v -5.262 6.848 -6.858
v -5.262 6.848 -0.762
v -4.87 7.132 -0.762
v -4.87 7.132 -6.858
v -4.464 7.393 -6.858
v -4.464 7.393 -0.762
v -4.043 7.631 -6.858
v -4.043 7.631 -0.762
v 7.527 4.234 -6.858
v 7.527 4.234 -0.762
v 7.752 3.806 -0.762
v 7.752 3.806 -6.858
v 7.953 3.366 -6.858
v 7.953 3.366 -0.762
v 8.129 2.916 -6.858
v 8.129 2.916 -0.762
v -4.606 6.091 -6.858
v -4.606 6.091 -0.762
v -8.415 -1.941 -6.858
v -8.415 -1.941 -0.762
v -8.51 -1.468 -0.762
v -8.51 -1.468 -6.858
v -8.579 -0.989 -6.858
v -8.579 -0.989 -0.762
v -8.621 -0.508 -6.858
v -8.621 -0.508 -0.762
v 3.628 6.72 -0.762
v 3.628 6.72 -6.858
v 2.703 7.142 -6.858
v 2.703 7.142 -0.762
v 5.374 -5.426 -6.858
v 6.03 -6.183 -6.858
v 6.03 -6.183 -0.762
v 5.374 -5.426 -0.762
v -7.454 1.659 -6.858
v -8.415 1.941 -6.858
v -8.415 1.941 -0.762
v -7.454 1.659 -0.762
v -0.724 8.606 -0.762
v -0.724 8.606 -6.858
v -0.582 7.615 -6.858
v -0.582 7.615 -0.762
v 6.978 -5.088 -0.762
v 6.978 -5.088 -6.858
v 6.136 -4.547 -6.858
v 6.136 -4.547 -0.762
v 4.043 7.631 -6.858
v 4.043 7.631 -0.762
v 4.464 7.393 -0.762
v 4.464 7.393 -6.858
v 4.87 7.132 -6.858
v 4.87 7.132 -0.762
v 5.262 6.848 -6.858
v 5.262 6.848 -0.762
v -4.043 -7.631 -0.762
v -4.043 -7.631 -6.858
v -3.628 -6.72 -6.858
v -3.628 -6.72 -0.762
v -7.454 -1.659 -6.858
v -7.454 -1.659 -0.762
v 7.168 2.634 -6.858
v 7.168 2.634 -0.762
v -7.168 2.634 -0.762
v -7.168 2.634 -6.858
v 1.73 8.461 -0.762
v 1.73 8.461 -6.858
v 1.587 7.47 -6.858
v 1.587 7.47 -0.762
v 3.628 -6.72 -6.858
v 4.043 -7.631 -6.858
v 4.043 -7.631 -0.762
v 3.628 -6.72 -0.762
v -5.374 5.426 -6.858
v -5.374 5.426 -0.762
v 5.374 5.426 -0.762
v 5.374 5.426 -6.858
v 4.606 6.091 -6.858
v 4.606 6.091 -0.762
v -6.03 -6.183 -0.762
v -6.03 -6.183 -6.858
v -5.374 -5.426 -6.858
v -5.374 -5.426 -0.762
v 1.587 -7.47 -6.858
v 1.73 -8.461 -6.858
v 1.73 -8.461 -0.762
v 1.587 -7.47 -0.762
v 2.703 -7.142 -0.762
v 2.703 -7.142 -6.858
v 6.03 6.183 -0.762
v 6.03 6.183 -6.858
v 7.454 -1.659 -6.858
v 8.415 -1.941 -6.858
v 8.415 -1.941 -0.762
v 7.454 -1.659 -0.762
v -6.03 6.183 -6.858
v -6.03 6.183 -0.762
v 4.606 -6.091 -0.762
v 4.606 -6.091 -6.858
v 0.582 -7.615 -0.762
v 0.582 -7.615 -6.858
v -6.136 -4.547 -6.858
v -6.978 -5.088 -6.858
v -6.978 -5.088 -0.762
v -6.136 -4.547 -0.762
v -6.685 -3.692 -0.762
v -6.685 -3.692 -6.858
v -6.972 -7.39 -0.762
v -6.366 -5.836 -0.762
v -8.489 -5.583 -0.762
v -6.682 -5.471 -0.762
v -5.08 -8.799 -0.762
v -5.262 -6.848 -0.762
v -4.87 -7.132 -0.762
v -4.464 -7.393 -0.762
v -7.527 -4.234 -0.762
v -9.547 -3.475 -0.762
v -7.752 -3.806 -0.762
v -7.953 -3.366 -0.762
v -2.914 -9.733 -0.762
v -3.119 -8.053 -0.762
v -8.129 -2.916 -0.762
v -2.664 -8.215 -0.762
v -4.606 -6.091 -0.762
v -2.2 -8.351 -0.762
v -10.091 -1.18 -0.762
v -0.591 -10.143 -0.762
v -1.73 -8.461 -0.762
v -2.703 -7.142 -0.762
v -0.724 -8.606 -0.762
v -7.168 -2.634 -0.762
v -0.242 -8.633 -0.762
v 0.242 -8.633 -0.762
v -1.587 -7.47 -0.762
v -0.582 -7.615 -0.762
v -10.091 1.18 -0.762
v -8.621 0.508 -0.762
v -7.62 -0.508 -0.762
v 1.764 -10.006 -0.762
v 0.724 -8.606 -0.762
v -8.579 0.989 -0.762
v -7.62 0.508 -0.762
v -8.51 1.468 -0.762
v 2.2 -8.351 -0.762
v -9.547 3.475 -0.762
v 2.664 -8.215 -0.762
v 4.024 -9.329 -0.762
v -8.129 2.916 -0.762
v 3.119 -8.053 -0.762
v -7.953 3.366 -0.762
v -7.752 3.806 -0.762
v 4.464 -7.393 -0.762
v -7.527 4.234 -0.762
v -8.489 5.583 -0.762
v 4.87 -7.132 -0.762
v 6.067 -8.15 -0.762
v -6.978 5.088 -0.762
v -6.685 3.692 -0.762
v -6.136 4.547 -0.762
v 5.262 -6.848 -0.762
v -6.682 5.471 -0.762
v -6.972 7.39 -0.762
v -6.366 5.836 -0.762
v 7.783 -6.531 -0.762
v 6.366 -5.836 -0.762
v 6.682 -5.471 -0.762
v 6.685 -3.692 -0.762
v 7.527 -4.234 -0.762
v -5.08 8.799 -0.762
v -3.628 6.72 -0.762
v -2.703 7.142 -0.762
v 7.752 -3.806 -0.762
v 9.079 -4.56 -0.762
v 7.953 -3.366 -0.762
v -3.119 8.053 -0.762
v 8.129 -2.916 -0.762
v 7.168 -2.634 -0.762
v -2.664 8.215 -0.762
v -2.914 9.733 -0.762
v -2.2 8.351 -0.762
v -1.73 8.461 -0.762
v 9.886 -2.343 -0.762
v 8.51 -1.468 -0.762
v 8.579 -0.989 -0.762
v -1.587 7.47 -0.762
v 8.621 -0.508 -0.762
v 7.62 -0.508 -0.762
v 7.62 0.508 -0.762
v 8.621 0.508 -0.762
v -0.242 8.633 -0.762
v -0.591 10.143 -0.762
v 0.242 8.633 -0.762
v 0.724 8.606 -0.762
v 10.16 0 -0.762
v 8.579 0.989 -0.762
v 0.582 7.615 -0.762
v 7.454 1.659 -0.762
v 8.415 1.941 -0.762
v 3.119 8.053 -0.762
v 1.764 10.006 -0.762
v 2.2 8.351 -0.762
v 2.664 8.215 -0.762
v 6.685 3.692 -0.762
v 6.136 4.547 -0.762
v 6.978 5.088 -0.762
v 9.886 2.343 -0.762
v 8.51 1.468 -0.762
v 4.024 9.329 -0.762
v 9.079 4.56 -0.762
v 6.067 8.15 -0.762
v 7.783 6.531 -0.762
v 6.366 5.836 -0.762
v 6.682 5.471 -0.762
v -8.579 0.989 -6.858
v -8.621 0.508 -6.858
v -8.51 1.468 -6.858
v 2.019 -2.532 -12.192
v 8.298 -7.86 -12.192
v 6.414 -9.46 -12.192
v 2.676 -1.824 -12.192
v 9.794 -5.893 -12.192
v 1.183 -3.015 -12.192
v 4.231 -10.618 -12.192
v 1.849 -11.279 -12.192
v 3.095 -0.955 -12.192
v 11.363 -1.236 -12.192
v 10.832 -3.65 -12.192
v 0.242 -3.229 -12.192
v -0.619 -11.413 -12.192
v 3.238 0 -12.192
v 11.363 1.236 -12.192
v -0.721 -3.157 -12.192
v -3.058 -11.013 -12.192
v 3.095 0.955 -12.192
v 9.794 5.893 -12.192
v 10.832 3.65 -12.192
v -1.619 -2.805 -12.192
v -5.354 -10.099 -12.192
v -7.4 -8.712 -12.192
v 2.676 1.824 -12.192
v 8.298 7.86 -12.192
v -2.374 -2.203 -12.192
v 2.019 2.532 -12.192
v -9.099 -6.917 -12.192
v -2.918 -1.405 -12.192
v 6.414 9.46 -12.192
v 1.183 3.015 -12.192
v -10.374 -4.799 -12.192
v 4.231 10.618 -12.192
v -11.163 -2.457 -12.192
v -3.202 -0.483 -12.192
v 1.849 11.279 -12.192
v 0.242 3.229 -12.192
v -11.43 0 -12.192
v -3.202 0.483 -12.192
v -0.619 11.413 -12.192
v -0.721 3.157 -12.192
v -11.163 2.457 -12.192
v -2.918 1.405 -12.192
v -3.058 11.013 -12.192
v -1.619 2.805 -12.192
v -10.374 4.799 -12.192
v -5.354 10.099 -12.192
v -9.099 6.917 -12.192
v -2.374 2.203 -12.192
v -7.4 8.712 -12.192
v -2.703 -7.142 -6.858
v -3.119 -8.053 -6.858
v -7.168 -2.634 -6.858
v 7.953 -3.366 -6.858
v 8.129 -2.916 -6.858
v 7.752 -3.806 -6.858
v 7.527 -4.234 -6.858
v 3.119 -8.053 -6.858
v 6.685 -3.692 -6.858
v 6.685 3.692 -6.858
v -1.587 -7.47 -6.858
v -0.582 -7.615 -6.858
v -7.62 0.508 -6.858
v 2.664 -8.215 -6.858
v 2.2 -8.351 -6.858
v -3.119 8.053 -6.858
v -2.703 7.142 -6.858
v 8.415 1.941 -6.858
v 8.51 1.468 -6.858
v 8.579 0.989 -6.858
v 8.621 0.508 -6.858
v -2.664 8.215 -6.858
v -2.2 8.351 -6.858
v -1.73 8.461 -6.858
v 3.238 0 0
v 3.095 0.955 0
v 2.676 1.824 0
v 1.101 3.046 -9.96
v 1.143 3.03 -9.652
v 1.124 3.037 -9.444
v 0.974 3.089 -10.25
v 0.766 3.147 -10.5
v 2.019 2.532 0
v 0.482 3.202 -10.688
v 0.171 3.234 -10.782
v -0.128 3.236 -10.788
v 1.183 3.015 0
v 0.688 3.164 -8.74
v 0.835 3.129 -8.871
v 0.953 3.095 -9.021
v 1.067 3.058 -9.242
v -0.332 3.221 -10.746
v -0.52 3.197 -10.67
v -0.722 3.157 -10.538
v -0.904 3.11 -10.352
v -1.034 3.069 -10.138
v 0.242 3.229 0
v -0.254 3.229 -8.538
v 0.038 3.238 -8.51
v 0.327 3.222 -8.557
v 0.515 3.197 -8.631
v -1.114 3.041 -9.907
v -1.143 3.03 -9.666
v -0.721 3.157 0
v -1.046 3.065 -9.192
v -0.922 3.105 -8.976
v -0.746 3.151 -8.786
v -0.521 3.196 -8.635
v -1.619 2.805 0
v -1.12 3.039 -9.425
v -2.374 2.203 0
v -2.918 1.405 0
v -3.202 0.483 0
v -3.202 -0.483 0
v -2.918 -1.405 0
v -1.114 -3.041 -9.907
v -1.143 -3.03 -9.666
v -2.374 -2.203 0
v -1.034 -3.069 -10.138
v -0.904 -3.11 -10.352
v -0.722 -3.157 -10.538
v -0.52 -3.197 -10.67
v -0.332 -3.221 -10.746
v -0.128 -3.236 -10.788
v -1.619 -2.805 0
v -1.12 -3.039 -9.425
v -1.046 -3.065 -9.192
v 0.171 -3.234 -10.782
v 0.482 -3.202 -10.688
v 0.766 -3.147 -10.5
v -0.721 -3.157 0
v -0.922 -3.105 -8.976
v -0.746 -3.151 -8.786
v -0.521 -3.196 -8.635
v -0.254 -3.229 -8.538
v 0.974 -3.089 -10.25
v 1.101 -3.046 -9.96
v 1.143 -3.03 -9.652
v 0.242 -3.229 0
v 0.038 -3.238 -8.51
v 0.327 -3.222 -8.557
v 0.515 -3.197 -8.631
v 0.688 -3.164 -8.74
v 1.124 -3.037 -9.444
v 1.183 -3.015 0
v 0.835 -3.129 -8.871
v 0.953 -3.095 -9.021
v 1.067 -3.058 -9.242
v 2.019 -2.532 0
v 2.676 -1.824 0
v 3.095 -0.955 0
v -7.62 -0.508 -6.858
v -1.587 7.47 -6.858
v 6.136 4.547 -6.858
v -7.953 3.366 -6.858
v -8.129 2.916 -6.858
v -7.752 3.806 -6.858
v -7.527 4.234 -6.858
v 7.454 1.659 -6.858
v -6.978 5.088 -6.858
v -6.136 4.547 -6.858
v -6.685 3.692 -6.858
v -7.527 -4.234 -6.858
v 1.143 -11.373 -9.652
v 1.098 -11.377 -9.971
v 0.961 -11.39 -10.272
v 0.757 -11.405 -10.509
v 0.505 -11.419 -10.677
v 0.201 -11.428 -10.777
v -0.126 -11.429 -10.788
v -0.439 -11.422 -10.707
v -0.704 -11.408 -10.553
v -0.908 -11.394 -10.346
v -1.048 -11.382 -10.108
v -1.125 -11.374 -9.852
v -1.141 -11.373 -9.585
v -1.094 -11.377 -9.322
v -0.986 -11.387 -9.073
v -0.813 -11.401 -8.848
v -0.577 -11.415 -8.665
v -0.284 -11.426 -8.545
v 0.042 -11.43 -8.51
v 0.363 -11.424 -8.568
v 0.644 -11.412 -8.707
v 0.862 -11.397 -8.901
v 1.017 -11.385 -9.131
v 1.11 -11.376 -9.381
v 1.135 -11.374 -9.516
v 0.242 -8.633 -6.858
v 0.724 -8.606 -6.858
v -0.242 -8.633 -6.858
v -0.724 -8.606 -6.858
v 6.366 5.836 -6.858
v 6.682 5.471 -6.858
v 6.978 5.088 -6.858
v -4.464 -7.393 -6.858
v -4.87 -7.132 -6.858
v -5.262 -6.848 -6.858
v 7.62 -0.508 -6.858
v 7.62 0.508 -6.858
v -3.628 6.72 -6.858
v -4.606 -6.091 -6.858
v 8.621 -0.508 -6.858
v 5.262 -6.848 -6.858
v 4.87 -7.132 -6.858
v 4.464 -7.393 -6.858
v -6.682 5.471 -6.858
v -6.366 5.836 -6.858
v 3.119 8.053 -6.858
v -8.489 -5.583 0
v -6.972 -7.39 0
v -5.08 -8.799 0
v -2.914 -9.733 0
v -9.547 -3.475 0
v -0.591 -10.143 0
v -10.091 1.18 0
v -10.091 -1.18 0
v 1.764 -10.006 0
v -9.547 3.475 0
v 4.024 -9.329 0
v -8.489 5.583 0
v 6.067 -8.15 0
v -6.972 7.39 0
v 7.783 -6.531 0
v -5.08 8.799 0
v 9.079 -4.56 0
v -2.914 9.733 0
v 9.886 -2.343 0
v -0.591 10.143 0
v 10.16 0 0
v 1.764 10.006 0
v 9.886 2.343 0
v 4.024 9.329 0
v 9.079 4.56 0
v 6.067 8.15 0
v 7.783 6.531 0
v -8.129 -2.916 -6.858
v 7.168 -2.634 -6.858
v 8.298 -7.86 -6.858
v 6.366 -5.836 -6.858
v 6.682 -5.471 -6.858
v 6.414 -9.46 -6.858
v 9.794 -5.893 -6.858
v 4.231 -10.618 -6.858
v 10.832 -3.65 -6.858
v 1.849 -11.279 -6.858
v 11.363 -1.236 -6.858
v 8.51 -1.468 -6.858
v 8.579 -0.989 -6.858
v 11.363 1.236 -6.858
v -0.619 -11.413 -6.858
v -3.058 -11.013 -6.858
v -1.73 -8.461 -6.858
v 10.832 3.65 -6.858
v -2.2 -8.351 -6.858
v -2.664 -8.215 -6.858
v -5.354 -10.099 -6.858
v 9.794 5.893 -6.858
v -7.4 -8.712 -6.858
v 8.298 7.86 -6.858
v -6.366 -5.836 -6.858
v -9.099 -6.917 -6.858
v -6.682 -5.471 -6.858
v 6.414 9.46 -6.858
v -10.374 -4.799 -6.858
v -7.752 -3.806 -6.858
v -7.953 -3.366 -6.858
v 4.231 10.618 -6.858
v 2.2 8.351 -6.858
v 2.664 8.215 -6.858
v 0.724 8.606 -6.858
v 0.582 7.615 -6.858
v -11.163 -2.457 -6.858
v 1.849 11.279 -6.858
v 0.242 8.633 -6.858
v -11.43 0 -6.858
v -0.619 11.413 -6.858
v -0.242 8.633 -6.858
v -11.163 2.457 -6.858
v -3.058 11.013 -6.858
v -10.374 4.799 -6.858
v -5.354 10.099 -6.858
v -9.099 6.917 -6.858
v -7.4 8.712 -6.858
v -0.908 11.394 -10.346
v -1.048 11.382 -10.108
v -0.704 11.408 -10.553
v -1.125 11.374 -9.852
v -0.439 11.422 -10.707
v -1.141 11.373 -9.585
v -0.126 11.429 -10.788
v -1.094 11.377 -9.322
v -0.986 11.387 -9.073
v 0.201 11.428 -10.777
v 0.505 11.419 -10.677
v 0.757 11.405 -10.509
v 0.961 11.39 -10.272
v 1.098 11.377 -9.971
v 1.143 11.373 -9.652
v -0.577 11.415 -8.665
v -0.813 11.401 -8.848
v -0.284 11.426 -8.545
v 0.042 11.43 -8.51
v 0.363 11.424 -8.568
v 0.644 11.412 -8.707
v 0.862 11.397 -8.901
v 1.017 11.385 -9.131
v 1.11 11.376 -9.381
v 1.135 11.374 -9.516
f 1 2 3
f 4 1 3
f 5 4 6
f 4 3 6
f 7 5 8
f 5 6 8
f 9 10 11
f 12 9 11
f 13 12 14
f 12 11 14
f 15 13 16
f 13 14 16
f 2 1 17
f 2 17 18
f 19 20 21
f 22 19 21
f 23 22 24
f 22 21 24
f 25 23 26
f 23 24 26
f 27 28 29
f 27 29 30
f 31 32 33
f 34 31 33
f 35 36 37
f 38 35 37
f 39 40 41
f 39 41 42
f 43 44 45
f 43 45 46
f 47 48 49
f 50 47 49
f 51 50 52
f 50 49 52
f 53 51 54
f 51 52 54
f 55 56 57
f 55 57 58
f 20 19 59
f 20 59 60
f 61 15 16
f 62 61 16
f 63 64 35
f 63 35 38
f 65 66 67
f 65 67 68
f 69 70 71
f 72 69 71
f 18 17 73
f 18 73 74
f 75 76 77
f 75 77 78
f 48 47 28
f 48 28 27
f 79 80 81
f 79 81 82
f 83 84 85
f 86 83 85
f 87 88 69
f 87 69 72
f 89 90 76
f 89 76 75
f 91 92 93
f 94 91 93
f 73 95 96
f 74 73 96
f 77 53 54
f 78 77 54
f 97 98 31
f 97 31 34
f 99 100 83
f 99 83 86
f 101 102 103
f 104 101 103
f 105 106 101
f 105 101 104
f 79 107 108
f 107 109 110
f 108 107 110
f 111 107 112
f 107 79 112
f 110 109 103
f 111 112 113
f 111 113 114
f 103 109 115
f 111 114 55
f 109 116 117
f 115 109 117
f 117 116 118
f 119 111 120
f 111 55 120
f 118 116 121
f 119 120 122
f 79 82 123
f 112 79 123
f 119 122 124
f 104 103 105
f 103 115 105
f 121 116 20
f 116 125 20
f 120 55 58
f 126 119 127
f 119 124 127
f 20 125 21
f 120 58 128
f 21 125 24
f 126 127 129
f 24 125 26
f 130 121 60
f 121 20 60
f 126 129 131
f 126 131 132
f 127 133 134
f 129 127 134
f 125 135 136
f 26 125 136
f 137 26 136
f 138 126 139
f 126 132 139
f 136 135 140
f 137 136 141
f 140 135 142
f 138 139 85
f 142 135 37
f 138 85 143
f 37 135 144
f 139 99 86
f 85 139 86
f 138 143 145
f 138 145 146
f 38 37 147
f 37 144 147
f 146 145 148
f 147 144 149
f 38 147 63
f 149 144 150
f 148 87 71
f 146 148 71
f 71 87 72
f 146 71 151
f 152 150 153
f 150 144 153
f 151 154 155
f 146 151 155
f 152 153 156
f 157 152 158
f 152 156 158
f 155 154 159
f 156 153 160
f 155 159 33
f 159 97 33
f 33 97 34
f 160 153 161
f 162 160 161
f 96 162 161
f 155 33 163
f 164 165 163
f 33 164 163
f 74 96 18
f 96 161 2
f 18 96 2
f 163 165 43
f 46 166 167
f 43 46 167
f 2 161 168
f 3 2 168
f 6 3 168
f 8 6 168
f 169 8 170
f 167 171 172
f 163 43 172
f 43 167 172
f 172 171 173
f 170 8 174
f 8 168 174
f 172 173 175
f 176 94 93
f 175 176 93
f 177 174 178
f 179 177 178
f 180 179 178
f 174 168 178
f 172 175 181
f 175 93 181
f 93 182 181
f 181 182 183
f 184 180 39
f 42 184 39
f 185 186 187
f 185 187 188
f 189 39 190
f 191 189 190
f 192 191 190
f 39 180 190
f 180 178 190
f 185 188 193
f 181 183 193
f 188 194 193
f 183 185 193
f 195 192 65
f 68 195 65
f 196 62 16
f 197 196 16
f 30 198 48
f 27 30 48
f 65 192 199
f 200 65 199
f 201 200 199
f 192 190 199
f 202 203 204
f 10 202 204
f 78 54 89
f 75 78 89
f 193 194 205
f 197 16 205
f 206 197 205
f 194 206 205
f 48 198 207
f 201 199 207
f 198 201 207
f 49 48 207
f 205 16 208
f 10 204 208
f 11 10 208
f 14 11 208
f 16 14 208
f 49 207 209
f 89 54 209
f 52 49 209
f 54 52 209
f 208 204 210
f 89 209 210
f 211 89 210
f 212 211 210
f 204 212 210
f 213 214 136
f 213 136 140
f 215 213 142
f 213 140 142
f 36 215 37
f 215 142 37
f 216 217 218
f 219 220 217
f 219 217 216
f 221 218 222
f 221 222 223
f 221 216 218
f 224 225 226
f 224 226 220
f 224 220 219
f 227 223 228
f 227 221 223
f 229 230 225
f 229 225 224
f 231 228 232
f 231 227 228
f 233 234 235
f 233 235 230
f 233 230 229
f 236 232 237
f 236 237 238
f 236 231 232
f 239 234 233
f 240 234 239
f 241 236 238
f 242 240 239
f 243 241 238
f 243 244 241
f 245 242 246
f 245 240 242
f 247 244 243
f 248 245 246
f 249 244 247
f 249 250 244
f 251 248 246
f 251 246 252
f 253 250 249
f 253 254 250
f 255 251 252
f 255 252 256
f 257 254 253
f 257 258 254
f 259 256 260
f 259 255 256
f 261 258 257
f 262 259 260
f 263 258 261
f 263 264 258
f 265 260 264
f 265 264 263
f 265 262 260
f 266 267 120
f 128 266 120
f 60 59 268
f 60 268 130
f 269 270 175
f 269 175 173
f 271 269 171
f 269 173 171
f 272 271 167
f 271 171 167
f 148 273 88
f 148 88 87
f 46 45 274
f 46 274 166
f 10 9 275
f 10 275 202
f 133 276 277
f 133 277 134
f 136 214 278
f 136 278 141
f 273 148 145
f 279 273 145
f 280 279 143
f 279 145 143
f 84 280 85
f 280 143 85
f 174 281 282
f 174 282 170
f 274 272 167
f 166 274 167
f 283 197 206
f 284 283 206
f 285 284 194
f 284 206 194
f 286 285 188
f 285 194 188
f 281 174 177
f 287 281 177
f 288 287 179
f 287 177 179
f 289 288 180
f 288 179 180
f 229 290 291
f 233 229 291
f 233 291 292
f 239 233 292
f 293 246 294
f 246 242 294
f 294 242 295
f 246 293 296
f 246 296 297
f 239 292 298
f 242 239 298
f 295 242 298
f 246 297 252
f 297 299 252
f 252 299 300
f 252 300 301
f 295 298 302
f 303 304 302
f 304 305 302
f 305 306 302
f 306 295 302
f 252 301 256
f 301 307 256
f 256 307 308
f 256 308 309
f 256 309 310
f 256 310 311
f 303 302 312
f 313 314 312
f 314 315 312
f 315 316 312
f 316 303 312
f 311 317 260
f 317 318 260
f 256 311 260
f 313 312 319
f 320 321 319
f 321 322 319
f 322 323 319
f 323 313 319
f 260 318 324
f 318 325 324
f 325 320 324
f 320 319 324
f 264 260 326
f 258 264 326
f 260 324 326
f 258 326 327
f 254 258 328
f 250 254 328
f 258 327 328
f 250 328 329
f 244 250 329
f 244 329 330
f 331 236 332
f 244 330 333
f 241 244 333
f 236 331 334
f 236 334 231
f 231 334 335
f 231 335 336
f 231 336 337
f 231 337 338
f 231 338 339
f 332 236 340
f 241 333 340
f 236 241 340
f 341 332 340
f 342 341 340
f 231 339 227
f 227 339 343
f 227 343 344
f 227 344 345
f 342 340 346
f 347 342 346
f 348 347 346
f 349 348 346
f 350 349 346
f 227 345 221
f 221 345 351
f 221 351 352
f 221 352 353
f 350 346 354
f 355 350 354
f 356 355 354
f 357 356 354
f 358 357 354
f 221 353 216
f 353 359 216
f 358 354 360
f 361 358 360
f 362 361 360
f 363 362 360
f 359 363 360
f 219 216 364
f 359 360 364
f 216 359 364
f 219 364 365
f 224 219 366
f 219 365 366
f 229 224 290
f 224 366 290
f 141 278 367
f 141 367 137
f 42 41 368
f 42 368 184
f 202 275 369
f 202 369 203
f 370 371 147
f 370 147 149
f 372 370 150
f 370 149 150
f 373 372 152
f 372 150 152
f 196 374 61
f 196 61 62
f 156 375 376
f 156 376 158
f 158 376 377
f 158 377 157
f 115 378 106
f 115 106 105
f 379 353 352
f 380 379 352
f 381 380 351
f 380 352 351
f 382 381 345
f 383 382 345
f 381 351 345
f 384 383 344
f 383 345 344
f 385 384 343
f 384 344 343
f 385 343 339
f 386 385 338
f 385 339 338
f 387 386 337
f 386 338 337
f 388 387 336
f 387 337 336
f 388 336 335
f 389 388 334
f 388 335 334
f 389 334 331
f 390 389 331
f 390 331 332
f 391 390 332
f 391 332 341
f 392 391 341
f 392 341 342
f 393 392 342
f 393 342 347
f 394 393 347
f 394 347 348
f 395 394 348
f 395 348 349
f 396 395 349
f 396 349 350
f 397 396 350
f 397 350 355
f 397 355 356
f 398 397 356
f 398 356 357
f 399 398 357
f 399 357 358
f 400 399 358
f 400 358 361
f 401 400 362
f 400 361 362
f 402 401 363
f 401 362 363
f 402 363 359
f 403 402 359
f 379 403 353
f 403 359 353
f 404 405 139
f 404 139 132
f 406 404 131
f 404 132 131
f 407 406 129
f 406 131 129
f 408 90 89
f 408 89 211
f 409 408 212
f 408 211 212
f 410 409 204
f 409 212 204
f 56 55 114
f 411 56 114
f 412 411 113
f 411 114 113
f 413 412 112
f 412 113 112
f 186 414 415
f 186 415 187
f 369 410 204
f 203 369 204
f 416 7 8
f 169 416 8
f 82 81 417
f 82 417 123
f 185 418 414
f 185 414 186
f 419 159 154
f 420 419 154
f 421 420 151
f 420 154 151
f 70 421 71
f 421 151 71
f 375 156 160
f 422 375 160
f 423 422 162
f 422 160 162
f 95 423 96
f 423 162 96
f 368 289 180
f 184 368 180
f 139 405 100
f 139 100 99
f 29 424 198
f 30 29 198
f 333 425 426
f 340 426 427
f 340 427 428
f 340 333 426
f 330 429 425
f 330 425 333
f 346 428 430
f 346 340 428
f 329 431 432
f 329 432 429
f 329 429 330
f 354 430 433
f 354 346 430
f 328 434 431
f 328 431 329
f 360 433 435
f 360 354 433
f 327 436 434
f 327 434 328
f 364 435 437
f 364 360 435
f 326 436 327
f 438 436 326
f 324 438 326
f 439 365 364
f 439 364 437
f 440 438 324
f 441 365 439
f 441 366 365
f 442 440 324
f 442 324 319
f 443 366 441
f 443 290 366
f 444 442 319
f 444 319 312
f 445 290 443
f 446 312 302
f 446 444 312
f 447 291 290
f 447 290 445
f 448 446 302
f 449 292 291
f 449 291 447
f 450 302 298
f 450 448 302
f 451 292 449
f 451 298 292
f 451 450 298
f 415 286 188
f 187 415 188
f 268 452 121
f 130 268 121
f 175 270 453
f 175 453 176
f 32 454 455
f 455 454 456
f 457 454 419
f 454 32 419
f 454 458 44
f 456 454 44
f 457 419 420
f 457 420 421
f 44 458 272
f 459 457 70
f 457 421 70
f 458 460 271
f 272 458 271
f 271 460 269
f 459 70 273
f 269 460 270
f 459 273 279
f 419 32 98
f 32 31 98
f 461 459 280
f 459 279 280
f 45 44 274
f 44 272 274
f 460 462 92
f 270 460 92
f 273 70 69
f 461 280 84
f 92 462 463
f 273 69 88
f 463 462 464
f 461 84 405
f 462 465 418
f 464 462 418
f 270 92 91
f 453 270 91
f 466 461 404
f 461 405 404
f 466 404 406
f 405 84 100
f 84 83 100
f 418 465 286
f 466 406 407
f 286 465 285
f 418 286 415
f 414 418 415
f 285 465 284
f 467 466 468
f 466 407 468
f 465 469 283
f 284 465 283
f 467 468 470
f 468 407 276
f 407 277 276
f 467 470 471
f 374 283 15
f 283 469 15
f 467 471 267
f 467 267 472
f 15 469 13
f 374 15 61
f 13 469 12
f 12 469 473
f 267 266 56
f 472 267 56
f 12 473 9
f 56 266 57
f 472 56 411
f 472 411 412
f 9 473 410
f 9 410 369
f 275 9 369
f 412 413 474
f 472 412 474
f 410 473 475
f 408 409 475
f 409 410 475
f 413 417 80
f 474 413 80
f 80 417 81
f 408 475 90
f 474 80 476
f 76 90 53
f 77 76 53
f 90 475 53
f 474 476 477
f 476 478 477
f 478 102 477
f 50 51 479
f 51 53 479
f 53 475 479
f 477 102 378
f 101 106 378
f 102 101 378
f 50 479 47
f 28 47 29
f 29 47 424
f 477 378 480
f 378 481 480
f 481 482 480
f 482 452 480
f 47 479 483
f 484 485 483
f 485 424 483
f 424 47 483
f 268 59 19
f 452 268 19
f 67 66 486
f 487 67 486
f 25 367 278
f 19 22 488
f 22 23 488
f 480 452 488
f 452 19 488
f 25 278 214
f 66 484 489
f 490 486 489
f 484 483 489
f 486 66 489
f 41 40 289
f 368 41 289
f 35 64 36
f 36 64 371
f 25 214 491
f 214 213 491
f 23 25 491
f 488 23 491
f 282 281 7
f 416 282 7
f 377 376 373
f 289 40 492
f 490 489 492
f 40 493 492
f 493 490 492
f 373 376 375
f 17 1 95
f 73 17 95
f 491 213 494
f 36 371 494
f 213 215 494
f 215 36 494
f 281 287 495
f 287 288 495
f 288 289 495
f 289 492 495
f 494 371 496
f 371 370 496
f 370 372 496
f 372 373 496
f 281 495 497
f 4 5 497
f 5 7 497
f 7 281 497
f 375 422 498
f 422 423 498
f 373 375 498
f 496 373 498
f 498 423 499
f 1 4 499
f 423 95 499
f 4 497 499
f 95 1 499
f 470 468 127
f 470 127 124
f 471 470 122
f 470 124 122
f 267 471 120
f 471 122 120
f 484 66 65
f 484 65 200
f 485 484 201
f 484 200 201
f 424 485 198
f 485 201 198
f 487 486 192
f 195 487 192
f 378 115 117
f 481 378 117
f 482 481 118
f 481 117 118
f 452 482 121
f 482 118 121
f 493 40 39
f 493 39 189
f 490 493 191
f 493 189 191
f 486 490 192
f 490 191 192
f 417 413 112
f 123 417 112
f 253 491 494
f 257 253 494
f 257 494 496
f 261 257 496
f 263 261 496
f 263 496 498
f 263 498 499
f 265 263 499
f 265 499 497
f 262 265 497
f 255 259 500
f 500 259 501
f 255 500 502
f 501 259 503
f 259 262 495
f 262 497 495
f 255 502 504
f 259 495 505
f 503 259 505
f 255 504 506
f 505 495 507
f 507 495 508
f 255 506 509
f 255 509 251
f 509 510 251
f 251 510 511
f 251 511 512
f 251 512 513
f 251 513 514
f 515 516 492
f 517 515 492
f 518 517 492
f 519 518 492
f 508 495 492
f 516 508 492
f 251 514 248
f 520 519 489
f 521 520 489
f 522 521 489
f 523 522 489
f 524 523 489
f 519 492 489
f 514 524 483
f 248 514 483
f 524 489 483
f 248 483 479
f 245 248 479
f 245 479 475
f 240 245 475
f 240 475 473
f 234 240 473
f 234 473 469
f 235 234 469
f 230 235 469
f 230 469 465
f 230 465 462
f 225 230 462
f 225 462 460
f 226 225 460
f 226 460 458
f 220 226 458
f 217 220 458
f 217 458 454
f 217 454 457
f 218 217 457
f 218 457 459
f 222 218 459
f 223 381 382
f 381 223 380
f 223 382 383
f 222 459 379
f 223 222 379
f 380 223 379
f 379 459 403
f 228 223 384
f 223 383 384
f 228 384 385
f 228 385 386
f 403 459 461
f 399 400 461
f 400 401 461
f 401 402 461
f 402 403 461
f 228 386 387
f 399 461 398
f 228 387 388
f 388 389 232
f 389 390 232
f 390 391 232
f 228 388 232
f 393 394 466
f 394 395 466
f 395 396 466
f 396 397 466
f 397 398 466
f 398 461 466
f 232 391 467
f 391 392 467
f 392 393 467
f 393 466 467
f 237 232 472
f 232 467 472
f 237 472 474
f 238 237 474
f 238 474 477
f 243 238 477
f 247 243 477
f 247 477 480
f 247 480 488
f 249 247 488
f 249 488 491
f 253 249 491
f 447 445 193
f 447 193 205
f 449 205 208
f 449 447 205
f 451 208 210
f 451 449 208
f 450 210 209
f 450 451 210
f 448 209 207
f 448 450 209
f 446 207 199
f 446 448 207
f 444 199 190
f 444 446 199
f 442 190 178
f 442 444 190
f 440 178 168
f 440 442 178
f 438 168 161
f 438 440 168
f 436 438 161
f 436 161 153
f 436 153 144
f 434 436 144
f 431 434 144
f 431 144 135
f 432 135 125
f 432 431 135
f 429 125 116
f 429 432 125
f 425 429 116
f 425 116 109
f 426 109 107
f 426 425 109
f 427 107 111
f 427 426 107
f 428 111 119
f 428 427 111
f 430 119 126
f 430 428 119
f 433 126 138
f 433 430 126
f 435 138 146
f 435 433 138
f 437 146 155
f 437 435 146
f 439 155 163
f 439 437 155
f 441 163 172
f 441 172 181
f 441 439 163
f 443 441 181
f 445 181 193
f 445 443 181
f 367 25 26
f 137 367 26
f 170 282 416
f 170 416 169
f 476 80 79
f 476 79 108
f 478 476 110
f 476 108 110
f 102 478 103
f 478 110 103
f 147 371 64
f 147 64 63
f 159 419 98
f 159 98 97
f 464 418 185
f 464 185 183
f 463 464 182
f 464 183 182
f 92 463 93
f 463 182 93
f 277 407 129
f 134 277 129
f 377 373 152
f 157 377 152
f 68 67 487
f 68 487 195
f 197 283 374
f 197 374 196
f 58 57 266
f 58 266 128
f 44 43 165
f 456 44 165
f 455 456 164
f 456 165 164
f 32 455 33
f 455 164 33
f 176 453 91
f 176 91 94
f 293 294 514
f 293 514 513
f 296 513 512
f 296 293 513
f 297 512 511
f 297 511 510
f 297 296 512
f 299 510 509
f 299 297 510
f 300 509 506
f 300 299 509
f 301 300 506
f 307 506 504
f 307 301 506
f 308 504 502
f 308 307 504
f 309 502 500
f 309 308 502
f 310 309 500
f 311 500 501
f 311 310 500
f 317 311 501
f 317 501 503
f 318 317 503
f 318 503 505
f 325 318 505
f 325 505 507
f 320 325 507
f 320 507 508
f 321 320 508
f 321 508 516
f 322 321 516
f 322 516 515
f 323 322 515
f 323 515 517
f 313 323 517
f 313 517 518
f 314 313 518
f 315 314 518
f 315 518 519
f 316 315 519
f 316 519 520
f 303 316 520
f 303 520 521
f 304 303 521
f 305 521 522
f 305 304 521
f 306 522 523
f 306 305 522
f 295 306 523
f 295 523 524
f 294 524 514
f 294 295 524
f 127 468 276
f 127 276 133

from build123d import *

# Parameters (mm, degrees)
SKETCH1_R               = 10.16
BOSS_EXTRUDE1_DEPTH     = 0.762
SKETCH2_R               = 8.636
BOSS_EXTRUDE2_DEPTH     = 6.096
SKETCH3_R               = 11.43
BOSS_EXTRUDE3_DEPTH     = 5.334
SKETCH4_R               = 3.2385
CUT_EXTRUDE1_DEPTH      = 25.654
SKETCH5_W               = 6.096
SKETCH5_H               = 1.016
CUT_EXTRUDE2_DEPTH      = 1.016
CIRPATTERN1_COUNT       = 22
CUT_EXTRUDE3_DEPTH      = 22.098
CUT_EXTRUDE3_DEPTH_BACK = 22.098
SKETCH6_R               = 1.143


with BuildPart() as part:
    # Sketch1 → Boss-Extrude1 (new body)
    with BuildSketch(Plane.XY):
        Circle(SKETCH1_R)
    extrude(amount=-BOSS_EXTRUDE1_DEPTH)

    # Sketch2 → Boss-Extrude2 (add)
    with BuildSketch(Plane(origin=(0, 0, -0.762), x_dir=(-1, 0, 0), z_dir=(0, 0, -1))):
        Circle(SKETCH2_R)
    extrude(amount=BOSS_EXTRUDE2_DEPTH)

    # Sketch3 → Boss-Extrude3 (add)
    with BuildSketch(Plane(origin=(0, 0, -6.858), x_dir=(-1, 0, 0), z_dir=(0, 0, -1))):
        Circle(SKETCH3_R)
    extrude(amount=BOSS_EXTRUDE3_DEPTH)

    # Sketch4 → Cut-Extrude1 (cut)
    with BuildSketch(Plane.XY):
        Circle(SKETCH4_R)
    extrude(amount=-CUT_EXTRUDE1_DEPTH, mode=Mode.SUBTRACT)

    # Sketch5 → Cut-Extrude2 (cut)
    with BuildSketch(Plane.ZY.offset(8.636)):
        with Locations((-3.81, 0)):
            Rectangle(SKETCH5_W, SKETCH5_H)
    cut_extrude2 = extrude(amount=-CUT_EXTRUDE2_DEPTH, mode=Mode.SUBTRACT)

    # CirPattern1: Cut-Extrude2 ×22 about axis
    cirpattern1_axis = Axis((0, 0, -12.192), (0, 0, 1))
    for i in range(1, CIRPATTERN1_COUNT):
        add(cut_extrude2.rotate(cirpattern1_axis, i * 360 / CIRPATTERN1_COUNT), mode=Mode.SUBTRACT)

    # Sketch6 → Cut-Extrude3 (cut, two sides: drawn at the far end of the back side and taken through both)
    with BuildSketch(Plane(origin=(0, 0, 0), x_dir=(1, 0, 0), z_dir=(0, 1, 0)).offset(-CUT_EXTRUDE3_DEPTH_BACK)):
        with Locations((0, 9.652)):
            Circle(SKETCH6_R)
    extrude(amount=CUT_EXTRUDE3_DEPTH + CUT_EXTRUDE3_DEPTH_BACK, mode=Mode.SUBTRACT)


solid = part.part
